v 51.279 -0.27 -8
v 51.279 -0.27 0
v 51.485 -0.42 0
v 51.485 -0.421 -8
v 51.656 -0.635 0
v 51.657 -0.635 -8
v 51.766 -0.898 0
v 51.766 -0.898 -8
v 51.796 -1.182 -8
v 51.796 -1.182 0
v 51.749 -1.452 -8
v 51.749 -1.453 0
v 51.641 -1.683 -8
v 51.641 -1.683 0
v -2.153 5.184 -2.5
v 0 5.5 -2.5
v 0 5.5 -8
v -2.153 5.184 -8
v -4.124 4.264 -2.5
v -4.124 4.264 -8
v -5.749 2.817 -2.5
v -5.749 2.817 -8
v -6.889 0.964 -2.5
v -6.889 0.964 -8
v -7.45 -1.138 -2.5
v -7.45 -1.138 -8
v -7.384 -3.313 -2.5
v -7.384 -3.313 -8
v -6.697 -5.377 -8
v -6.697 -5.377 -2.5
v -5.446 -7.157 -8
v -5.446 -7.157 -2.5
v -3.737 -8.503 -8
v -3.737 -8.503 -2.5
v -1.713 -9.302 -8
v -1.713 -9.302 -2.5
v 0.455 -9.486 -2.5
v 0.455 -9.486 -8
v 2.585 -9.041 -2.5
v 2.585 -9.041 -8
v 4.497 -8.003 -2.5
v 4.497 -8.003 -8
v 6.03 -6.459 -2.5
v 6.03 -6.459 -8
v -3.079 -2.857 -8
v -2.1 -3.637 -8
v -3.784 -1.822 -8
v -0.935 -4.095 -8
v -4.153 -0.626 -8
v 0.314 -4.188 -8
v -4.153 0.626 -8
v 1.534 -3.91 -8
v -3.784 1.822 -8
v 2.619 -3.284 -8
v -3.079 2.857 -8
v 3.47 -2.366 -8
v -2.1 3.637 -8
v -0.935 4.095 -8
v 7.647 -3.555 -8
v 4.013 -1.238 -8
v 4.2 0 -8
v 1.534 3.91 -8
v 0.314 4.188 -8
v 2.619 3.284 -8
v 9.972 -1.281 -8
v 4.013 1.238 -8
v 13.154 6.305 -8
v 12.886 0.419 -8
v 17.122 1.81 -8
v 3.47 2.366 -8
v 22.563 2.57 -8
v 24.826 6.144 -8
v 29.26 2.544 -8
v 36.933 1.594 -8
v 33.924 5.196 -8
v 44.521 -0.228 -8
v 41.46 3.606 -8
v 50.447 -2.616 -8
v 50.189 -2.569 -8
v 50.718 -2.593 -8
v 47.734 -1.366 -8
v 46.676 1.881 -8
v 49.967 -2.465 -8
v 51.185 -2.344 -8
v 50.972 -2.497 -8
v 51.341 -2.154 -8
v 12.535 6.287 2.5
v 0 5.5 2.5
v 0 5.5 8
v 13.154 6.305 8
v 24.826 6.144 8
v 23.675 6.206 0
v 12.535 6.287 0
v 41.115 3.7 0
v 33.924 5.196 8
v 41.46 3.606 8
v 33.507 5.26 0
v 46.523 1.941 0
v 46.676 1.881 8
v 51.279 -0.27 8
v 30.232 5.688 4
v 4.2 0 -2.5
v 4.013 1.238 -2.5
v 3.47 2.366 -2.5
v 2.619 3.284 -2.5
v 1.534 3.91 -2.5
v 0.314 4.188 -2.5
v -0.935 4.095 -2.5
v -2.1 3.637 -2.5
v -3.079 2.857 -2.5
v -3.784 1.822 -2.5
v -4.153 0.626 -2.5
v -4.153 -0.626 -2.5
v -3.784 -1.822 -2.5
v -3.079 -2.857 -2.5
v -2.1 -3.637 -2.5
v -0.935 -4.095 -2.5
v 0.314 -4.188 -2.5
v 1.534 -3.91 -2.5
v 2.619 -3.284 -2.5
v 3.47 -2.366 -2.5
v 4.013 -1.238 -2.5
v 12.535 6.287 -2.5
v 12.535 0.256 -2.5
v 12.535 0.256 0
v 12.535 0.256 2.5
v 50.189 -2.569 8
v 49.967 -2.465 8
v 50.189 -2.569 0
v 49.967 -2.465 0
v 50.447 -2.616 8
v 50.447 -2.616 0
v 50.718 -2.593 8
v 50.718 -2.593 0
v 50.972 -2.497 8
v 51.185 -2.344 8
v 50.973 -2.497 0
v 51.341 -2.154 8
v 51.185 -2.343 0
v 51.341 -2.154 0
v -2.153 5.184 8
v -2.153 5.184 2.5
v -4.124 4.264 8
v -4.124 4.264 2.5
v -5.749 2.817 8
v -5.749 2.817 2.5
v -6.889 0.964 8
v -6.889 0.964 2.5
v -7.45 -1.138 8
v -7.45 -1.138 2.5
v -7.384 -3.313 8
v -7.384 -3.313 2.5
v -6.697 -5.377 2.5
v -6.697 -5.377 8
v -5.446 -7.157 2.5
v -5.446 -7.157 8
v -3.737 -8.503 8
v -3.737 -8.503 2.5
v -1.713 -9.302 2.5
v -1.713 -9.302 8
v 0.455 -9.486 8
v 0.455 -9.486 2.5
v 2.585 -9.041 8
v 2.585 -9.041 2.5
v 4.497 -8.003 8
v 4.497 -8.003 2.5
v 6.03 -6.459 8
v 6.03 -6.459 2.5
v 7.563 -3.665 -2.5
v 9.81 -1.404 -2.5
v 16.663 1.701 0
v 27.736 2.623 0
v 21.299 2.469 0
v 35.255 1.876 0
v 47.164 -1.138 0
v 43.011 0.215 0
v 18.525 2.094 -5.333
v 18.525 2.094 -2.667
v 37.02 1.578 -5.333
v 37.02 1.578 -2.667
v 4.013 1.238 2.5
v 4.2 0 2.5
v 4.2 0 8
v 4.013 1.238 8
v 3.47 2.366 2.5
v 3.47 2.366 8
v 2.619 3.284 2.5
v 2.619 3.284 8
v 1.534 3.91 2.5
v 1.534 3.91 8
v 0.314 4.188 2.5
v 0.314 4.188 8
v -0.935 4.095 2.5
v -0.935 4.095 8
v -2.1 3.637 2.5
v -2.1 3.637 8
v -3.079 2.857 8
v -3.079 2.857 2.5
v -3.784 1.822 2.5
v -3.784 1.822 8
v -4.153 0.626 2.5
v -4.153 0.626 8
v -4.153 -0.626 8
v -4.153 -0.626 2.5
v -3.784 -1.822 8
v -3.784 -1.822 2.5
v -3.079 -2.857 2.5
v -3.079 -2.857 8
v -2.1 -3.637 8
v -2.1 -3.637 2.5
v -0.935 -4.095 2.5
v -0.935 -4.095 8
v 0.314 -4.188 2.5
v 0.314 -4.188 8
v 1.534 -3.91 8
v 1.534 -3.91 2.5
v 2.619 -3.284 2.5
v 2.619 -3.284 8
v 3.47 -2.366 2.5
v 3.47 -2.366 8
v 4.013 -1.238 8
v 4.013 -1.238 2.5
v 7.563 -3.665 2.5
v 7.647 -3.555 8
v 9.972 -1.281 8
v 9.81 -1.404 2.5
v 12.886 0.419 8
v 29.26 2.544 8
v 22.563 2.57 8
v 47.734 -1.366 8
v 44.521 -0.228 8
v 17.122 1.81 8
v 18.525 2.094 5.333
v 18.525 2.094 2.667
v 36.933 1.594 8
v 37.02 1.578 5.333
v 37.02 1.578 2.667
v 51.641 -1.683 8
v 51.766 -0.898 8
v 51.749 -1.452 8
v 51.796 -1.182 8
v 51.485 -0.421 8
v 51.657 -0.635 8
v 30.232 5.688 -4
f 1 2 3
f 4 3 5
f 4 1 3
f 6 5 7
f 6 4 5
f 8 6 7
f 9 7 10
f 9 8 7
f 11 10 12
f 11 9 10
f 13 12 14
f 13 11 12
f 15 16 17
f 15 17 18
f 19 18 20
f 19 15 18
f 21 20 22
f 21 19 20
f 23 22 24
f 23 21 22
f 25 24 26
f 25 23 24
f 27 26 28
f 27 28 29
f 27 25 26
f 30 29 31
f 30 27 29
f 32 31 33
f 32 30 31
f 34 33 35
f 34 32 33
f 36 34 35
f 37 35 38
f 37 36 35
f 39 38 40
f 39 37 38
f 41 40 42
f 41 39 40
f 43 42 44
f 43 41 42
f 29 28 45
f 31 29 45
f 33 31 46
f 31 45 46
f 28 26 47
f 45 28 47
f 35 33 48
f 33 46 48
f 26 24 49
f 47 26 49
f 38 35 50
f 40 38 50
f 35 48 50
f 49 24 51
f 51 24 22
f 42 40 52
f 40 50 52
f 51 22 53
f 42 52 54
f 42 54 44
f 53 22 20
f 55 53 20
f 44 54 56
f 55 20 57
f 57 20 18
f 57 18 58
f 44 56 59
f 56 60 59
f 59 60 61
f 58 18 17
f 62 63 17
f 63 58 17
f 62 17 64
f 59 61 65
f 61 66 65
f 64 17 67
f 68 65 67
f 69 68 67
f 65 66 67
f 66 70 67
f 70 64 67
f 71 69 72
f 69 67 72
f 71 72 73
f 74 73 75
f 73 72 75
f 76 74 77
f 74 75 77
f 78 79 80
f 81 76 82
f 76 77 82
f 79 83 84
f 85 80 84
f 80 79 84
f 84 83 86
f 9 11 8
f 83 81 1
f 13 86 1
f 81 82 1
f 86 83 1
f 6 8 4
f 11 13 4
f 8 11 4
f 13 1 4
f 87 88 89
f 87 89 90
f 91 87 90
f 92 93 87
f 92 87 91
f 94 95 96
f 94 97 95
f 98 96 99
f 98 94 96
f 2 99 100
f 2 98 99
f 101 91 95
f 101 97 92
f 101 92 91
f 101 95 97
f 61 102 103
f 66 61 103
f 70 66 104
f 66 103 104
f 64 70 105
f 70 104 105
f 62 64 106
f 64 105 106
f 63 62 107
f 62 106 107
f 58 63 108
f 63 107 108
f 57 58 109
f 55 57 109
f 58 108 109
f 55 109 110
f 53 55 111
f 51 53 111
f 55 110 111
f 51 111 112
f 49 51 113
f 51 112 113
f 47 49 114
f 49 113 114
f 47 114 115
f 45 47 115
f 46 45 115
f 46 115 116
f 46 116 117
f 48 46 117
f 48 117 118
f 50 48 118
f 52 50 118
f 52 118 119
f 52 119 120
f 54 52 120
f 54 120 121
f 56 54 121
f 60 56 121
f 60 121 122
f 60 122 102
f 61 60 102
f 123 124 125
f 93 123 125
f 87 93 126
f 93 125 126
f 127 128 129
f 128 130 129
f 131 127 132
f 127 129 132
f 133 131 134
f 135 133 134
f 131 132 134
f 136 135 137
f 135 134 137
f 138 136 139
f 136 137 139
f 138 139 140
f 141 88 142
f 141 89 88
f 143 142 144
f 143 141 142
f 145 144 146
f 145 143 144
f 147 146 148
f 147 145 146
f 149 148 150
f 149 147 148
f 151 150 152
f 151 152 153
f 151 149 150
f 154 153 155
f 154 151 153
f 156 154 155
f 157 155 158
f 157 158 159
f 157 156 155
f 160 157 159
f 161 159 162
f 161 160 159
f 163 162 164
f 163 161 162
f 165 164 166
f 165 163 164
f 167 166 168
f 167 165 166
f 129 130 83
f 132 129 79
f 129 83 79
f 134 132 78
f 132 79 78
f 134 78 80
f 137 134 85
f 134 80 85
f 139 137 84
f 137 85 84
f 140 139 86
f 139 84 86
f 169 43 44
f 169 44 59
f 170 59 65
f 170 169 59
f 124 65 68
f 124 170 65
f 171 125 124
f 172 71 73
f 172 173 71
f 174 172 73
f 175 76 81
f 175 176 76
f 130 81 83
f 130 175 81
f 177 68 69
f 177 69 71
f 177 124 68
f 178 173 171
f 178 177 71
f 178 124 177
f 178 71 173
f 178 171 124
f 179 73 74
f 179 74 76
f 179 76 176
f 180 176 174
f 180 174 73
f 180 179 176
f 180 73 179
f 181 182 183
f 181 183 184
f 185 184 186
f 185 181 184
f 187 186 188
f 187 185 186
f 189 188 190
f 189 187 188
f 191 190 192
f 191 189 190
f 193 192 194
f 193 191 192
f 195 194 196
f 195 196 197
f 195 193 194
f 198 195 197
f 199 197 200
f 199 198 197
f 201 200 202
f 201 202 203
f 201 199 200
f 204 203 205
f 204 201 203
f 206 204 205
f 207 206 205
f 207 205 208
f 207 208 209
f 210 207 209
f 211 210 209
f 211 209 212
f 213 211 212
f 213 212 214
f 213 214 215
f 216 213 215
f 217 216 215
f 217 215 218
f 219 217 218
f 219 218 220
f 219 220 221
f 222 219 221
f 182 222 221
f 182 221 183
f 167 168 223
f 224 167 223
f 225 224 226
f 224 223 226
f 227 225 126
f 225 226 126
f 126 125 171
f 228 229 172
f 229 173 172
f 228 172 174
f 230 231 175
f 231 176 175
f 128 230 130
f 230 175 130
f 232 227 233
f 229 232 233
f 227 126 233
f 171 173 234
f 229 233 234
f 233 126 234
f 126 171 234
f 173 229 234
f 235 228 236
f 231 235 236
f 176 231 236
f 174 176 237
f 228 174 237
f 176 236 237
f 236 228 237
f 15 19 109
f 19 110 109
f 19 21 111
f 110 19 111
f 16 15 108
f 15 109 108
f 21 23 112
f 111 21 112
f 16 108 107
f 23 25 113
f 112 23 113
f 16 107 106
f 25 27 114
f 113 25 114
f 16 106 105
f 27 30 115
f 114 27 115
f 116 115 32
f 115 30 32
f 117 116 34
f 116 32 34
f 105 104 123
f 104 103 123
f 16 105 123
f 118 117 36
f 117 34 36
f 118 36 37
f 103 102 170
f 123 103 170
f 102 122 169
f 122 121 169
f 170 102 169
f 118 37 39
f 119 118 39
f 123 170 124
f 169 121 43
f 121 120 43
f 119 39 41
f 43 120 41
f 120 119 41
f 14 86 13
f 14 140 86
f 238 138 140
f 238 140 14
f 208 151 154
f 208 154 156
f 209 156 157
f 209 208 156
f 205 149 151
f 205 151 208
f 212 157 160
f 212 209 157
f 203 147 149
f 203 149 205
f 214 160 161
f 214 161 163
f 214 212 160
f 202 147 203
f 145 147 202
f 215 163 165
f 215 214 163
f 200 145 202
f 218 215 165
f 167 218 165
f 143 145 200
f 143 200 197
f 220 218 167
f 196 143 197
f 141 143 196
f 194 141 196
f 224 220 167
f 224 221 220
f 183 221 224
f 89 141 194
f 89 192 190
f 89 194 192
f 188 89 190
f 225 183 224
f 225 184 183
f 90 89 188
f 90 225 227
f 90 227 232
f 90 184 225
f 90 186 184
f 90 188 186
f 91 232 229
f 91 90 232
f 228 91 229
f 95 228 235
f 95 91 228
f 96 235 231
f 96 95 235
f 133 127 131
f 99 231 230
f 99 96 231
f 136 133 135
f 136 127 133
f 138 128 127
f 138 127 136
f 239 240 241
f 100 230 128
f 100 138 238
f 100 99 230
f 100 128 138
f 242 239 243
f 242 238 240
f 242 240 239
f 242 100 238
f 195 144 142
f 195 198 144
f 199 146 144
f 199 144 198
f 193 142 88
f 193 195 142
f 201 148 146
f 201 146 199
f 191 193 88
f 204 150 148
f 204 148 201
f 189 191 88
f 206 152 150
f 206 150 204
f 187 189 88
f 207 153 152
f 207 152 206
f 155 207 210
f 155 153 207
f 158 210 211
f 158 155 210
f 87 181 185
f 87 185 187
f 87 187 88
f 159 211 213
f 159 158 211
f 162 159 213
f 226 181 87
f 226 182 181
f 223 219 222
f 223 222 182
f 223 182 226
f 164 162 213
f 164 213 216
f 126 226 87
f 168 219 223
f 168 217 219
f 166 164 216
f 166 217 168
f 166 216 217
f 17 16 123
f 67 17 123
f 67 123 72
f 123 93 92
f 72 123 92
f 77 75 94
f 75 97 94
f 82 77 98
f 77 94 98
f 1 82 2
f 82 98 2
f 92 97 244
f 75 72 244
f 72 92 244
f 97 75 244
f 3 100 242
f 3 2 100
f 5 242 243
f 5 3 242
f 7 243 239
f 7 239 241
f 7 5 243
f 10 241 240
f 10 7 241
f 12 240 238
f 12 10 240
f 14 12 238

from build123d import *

# Parameters (mm, degrees)
SKETCH_R          = 4.2
PAD_DEPTH         = 8
FILLET_R          = 1
SKETCH001_W       = 28.61805
SKETCH001_H       = 5
POCKET_DEPTH      = 6.359373
POCKET_DEPTH_BACK = -9.501


with BuildPart() as part:
    # Sketch → Pad (new body, symmetric)
    with BuildSketch(Plane.XY):
        with BuildLine():
            ThreePointArc((0, 5.5), (-6.69683, -5.376754), (6.030279, -6.459343))
            add(Edge.make_bspline(
                [(6.030279, -6.459343), (11.977673, 9.279221), (47.159592, 0.679194), (50.755966, -3.073543)],
                knots=[0, 0, 0, 0, 1, 1, 1, 1], degree=3))
            Line((50.755966, -3.073543), (52.204102, -0.7977))
            add(Edge.make_bspline(
                [(0, 5.5), (35.91824, 8.824372), (52.204102, -0.7977)],
                knots=[0, 0, 0, 1, 1, 1], degree=2, weights=[8, 8, 7.92]))
        make_face()
        Circle(SKETCH_R, mode=Mode.SUBTRACT)
    extrude(amount=PAD_DEPTH, both=True)

    # Fillet
    fillet_edges = [part.edges().sort_by_distance(p)[0] for p in [
        (50.755966, -3.073543, 0),
        (52.204102, -0.7977, 0),
    ]]
    fillet(fillet_edges, radius=FILLET_R)

    # Sketch001 → Pocket (cut, two sides)
    with BuildSketch(Plane.XZ) as pocket_sk:
        with Locations((-1.773529, 0)):
            Rectangle(SKETCH001_W, SKETCH001_H)
    extrude(amount=-POCKET_DEPTH, mode=Mode.SUBTRACT)
    extrude(pocket_sk.sketch, amount=-POCKET_DEPTH_BACK, mode=Mode.SUBTRACT)


solid = part.part
